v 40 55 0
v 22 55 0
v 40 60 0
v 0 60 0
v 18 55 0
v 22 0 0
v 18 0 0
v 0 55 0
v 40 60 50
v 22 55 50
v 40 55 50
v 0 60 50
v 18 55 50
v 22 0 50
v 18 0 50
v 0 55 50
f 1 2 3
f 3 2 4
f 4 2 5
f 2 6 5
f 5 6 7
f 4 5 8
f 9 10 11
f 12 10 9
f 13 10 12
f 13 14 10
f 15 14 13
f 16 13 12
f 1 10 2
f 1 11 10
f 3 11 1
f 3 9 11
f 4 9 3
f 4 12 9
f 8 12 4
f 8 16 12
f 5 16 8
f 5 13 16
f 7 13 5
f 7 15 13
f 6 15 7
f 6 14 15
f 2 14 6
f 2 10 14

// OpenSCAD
$fn = 32;

// ----------------------------------------------------------------------
// Structural section: tee 40 x 60 mm
// ----------------------------------------------------------------------

// --- parameters (mm) ---
sec_w = 40;               // tee width, X
sec_h = 60;               // tee height, Y
flange_t = 5;             // top flange thickness
web_t = 4;                // web thickness
plate_t = 50;             // cut length, Z (extrusion height)

profile = [[18, 0], [22, 0], [22, 55], [40, 55], [40, 60], [0, 60], [0, 55], [18, 55]];  // primary outline, 8 points, counter clockwise

// --- the one profile operation ---
linear_extrude(height = plate_t) polygon(points = profile);
